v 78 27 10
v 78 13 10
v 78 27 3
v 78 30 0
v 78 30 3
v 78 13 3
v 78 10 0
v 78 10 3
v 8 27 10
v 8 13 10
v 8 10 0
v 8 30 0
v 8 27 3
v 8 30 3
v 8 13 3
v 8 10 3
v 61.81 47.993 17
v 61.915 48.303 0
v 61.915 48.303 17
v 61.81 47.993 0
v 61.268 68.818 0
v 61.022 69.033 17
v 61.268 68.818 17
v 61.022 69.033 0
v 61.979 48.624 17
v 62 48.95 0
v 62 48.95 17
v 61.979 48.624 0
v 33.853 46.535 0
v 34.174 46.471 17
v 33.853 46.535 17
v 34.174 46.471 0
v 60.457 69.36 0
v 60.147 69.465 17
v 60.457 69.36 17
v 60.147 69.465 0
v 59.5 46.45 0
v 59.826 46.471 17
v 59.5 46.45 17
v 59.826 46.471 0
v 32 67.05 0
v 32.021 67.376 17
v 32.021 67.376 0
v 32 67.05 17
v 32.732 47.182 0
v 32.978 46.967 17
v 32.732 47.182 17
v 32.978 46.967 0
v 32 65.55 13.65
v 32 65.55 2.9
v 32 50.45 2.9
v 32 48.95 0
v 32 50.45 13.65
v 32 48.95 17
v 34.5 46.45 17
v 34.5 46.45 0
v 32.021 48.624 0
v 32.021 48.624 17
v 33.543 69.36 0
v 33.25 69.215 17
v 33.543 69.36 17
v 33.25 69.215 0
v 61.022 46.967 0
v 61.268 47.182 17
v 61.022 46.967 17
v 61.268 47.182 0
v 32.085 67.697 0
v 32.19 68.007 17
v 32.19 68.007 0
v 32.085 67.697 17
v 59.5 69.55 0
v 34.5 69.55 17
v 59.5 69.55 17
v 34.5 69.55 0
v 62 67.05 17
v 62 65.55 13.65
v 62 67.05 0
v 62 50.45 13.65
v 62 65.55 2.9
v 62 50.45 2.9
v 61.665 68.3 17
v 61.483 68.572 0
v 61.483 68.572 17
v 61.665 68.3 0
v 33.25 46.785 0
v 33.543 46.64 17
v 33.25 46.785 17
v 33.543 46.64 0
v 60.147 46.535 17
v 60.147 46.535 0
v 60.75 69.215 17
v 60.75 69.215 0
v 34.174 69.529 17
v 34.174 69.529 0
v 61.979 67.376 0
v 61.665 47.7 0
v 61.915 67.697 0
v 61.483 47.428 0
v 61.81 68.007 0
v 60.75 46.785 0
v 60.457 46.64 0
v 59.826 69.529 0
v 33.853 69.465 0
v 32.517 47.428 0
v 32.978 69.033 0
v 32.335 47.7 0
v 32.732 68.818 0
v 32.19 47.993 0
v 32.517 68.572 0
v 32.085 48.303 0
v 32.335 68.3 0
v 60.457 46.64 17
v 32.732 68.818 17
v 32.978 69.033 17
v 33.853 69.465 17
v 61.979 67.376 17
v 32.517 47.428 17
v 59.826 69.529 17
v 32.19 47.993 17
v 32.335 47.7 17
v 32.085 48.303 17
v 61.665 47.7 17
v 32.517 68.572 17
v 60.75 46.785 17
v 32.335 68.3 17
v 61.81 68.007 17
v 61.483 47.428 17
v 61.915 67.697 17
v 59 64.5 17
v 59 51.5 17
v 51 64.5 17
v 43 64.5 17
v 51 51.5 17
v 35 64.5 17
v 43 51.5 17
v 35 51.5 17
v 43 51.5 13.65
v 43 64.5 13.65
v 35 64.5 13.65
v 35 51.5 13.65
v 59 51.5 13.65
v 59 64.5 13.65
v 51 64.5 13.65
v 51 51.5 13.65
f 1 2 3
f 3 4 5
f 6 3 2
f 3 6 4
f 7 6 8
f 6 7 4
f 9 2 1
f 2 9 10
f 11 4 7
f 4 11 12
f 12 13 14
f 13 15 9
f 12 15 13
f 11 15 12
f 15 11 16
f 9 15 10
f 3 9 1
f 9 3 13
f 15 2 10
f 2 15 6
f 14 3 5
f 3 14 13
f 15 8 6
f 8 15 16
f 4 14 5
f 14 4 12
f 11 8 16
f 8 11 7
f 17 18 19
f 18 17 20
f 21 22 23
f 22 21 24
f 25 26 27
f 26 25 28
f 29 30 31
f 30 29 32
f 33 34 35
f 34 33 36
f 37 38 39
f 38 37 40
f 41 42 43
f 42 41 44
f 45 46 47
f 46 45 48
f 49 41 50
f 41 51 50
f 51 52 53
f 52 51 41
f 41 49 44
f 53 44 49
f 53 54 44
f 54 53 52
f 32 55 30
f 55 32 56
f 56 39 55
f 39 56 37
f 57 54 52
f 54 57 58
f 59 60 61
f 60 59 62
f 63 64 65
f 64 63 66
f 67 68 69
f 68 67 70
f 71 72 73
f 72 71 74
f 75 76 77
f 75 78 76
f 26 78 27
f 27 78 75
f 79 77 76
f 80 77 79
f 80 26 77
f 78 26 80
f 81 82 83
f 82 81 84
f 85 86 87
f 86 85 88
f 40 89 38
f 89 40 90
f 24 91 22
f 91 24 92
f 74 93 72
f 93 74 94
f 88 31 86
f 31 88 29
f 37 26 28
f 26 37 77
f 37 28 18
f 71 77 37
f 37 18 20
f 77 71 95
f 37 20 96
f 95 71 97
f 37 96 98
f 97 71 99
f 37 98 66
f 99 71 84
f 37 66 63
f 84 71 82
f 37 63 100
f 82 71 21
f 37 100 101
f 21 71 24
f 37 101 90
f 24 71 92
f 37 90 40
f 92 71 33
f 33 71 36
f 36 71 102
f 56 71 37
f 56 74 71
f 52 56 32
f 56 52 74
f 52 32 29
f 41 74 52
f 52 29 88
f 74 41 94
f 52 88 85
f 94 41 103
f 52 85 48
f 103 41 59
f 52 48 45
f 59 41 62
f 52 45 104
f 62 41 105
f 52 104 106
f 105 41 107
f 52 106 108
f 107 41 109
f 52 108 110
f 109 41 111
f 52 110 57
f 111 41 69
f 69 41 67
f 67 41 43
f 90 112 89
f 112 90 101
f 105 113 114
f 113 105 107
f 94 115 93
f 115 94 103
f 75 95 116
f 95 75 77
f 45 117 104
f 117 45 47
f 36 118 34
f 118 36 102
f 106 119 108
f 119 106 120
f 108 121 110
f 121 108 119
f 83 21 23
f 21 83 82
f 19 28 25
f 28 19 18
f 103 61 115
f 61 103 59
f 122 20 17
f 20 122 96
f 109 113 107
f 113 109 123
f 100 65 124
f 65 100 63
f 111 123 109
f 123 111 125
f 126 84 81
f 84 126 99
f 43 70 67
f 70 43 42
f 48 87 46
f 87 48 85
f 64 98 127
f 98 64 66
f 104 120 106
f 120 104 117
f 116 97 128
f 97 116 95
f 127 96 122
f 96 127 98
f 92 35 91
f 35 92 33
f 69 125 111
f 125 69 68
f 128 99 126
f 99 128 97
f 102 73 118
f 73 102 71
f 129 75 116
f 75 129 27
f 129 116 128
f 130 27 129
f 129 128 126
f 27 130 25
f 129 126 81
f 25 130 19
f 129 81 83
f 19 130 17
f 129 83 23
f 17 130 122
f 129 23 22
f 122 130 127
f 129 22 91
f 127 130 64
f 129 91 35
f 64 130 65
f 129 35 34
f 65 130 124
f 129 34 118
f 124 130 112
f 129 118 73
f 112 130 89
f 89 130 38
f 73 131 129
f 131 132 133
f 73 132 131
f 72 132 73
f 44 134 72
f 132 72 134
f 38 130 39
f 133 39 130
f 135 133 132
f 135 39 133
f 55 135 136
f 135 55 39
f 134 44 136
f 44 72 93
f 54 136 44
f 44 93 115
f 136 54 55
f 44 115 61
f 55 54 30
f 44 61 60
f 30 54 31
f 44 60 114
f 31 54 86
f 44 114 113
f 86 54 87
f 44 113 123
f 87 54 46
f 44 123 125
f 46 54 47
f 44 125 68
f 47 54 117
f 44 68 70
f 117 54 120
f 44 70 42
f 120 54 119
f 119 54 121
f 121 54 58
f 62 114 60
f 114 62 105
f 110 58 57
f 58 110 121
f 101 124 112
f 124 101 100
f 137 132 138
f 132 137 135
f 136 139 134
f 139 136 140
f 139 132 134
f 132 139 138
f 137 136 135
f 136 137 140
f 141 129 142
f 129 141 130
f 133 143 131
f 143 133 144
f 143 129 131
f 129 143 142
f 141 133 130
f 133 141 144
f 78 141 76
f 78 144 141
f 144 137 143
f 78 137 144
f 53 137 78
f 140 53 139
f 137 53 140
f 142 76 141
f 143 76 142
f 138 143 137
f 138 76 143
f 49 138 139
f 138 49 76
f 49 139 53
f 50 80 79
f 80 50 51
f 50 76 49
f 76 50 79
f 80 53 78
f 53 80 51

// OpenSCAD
/*
Sample 096: Vorgespannter Feder-Schlitten — robust
Generated from the FDM Mechanical Sample Library.
Units: millimetres.

Override examples:
  openscad -o custom.stl -D 'view="plate"' -D 'render_fn=64' model.scad
  openscad -o preview.png -D 'view="assembly"' model.scad
*/
use <../../../library/fdm_mechanisms.scad>

render_fn = is_undef(render_fn) ? 48 : render_fn;
view = is_undef(view) ? "plate" : view;
$fn = render_fn;

sample_preload_slider(
    view=view,
    clearance=0.55,
    beam_t=1.4
);
